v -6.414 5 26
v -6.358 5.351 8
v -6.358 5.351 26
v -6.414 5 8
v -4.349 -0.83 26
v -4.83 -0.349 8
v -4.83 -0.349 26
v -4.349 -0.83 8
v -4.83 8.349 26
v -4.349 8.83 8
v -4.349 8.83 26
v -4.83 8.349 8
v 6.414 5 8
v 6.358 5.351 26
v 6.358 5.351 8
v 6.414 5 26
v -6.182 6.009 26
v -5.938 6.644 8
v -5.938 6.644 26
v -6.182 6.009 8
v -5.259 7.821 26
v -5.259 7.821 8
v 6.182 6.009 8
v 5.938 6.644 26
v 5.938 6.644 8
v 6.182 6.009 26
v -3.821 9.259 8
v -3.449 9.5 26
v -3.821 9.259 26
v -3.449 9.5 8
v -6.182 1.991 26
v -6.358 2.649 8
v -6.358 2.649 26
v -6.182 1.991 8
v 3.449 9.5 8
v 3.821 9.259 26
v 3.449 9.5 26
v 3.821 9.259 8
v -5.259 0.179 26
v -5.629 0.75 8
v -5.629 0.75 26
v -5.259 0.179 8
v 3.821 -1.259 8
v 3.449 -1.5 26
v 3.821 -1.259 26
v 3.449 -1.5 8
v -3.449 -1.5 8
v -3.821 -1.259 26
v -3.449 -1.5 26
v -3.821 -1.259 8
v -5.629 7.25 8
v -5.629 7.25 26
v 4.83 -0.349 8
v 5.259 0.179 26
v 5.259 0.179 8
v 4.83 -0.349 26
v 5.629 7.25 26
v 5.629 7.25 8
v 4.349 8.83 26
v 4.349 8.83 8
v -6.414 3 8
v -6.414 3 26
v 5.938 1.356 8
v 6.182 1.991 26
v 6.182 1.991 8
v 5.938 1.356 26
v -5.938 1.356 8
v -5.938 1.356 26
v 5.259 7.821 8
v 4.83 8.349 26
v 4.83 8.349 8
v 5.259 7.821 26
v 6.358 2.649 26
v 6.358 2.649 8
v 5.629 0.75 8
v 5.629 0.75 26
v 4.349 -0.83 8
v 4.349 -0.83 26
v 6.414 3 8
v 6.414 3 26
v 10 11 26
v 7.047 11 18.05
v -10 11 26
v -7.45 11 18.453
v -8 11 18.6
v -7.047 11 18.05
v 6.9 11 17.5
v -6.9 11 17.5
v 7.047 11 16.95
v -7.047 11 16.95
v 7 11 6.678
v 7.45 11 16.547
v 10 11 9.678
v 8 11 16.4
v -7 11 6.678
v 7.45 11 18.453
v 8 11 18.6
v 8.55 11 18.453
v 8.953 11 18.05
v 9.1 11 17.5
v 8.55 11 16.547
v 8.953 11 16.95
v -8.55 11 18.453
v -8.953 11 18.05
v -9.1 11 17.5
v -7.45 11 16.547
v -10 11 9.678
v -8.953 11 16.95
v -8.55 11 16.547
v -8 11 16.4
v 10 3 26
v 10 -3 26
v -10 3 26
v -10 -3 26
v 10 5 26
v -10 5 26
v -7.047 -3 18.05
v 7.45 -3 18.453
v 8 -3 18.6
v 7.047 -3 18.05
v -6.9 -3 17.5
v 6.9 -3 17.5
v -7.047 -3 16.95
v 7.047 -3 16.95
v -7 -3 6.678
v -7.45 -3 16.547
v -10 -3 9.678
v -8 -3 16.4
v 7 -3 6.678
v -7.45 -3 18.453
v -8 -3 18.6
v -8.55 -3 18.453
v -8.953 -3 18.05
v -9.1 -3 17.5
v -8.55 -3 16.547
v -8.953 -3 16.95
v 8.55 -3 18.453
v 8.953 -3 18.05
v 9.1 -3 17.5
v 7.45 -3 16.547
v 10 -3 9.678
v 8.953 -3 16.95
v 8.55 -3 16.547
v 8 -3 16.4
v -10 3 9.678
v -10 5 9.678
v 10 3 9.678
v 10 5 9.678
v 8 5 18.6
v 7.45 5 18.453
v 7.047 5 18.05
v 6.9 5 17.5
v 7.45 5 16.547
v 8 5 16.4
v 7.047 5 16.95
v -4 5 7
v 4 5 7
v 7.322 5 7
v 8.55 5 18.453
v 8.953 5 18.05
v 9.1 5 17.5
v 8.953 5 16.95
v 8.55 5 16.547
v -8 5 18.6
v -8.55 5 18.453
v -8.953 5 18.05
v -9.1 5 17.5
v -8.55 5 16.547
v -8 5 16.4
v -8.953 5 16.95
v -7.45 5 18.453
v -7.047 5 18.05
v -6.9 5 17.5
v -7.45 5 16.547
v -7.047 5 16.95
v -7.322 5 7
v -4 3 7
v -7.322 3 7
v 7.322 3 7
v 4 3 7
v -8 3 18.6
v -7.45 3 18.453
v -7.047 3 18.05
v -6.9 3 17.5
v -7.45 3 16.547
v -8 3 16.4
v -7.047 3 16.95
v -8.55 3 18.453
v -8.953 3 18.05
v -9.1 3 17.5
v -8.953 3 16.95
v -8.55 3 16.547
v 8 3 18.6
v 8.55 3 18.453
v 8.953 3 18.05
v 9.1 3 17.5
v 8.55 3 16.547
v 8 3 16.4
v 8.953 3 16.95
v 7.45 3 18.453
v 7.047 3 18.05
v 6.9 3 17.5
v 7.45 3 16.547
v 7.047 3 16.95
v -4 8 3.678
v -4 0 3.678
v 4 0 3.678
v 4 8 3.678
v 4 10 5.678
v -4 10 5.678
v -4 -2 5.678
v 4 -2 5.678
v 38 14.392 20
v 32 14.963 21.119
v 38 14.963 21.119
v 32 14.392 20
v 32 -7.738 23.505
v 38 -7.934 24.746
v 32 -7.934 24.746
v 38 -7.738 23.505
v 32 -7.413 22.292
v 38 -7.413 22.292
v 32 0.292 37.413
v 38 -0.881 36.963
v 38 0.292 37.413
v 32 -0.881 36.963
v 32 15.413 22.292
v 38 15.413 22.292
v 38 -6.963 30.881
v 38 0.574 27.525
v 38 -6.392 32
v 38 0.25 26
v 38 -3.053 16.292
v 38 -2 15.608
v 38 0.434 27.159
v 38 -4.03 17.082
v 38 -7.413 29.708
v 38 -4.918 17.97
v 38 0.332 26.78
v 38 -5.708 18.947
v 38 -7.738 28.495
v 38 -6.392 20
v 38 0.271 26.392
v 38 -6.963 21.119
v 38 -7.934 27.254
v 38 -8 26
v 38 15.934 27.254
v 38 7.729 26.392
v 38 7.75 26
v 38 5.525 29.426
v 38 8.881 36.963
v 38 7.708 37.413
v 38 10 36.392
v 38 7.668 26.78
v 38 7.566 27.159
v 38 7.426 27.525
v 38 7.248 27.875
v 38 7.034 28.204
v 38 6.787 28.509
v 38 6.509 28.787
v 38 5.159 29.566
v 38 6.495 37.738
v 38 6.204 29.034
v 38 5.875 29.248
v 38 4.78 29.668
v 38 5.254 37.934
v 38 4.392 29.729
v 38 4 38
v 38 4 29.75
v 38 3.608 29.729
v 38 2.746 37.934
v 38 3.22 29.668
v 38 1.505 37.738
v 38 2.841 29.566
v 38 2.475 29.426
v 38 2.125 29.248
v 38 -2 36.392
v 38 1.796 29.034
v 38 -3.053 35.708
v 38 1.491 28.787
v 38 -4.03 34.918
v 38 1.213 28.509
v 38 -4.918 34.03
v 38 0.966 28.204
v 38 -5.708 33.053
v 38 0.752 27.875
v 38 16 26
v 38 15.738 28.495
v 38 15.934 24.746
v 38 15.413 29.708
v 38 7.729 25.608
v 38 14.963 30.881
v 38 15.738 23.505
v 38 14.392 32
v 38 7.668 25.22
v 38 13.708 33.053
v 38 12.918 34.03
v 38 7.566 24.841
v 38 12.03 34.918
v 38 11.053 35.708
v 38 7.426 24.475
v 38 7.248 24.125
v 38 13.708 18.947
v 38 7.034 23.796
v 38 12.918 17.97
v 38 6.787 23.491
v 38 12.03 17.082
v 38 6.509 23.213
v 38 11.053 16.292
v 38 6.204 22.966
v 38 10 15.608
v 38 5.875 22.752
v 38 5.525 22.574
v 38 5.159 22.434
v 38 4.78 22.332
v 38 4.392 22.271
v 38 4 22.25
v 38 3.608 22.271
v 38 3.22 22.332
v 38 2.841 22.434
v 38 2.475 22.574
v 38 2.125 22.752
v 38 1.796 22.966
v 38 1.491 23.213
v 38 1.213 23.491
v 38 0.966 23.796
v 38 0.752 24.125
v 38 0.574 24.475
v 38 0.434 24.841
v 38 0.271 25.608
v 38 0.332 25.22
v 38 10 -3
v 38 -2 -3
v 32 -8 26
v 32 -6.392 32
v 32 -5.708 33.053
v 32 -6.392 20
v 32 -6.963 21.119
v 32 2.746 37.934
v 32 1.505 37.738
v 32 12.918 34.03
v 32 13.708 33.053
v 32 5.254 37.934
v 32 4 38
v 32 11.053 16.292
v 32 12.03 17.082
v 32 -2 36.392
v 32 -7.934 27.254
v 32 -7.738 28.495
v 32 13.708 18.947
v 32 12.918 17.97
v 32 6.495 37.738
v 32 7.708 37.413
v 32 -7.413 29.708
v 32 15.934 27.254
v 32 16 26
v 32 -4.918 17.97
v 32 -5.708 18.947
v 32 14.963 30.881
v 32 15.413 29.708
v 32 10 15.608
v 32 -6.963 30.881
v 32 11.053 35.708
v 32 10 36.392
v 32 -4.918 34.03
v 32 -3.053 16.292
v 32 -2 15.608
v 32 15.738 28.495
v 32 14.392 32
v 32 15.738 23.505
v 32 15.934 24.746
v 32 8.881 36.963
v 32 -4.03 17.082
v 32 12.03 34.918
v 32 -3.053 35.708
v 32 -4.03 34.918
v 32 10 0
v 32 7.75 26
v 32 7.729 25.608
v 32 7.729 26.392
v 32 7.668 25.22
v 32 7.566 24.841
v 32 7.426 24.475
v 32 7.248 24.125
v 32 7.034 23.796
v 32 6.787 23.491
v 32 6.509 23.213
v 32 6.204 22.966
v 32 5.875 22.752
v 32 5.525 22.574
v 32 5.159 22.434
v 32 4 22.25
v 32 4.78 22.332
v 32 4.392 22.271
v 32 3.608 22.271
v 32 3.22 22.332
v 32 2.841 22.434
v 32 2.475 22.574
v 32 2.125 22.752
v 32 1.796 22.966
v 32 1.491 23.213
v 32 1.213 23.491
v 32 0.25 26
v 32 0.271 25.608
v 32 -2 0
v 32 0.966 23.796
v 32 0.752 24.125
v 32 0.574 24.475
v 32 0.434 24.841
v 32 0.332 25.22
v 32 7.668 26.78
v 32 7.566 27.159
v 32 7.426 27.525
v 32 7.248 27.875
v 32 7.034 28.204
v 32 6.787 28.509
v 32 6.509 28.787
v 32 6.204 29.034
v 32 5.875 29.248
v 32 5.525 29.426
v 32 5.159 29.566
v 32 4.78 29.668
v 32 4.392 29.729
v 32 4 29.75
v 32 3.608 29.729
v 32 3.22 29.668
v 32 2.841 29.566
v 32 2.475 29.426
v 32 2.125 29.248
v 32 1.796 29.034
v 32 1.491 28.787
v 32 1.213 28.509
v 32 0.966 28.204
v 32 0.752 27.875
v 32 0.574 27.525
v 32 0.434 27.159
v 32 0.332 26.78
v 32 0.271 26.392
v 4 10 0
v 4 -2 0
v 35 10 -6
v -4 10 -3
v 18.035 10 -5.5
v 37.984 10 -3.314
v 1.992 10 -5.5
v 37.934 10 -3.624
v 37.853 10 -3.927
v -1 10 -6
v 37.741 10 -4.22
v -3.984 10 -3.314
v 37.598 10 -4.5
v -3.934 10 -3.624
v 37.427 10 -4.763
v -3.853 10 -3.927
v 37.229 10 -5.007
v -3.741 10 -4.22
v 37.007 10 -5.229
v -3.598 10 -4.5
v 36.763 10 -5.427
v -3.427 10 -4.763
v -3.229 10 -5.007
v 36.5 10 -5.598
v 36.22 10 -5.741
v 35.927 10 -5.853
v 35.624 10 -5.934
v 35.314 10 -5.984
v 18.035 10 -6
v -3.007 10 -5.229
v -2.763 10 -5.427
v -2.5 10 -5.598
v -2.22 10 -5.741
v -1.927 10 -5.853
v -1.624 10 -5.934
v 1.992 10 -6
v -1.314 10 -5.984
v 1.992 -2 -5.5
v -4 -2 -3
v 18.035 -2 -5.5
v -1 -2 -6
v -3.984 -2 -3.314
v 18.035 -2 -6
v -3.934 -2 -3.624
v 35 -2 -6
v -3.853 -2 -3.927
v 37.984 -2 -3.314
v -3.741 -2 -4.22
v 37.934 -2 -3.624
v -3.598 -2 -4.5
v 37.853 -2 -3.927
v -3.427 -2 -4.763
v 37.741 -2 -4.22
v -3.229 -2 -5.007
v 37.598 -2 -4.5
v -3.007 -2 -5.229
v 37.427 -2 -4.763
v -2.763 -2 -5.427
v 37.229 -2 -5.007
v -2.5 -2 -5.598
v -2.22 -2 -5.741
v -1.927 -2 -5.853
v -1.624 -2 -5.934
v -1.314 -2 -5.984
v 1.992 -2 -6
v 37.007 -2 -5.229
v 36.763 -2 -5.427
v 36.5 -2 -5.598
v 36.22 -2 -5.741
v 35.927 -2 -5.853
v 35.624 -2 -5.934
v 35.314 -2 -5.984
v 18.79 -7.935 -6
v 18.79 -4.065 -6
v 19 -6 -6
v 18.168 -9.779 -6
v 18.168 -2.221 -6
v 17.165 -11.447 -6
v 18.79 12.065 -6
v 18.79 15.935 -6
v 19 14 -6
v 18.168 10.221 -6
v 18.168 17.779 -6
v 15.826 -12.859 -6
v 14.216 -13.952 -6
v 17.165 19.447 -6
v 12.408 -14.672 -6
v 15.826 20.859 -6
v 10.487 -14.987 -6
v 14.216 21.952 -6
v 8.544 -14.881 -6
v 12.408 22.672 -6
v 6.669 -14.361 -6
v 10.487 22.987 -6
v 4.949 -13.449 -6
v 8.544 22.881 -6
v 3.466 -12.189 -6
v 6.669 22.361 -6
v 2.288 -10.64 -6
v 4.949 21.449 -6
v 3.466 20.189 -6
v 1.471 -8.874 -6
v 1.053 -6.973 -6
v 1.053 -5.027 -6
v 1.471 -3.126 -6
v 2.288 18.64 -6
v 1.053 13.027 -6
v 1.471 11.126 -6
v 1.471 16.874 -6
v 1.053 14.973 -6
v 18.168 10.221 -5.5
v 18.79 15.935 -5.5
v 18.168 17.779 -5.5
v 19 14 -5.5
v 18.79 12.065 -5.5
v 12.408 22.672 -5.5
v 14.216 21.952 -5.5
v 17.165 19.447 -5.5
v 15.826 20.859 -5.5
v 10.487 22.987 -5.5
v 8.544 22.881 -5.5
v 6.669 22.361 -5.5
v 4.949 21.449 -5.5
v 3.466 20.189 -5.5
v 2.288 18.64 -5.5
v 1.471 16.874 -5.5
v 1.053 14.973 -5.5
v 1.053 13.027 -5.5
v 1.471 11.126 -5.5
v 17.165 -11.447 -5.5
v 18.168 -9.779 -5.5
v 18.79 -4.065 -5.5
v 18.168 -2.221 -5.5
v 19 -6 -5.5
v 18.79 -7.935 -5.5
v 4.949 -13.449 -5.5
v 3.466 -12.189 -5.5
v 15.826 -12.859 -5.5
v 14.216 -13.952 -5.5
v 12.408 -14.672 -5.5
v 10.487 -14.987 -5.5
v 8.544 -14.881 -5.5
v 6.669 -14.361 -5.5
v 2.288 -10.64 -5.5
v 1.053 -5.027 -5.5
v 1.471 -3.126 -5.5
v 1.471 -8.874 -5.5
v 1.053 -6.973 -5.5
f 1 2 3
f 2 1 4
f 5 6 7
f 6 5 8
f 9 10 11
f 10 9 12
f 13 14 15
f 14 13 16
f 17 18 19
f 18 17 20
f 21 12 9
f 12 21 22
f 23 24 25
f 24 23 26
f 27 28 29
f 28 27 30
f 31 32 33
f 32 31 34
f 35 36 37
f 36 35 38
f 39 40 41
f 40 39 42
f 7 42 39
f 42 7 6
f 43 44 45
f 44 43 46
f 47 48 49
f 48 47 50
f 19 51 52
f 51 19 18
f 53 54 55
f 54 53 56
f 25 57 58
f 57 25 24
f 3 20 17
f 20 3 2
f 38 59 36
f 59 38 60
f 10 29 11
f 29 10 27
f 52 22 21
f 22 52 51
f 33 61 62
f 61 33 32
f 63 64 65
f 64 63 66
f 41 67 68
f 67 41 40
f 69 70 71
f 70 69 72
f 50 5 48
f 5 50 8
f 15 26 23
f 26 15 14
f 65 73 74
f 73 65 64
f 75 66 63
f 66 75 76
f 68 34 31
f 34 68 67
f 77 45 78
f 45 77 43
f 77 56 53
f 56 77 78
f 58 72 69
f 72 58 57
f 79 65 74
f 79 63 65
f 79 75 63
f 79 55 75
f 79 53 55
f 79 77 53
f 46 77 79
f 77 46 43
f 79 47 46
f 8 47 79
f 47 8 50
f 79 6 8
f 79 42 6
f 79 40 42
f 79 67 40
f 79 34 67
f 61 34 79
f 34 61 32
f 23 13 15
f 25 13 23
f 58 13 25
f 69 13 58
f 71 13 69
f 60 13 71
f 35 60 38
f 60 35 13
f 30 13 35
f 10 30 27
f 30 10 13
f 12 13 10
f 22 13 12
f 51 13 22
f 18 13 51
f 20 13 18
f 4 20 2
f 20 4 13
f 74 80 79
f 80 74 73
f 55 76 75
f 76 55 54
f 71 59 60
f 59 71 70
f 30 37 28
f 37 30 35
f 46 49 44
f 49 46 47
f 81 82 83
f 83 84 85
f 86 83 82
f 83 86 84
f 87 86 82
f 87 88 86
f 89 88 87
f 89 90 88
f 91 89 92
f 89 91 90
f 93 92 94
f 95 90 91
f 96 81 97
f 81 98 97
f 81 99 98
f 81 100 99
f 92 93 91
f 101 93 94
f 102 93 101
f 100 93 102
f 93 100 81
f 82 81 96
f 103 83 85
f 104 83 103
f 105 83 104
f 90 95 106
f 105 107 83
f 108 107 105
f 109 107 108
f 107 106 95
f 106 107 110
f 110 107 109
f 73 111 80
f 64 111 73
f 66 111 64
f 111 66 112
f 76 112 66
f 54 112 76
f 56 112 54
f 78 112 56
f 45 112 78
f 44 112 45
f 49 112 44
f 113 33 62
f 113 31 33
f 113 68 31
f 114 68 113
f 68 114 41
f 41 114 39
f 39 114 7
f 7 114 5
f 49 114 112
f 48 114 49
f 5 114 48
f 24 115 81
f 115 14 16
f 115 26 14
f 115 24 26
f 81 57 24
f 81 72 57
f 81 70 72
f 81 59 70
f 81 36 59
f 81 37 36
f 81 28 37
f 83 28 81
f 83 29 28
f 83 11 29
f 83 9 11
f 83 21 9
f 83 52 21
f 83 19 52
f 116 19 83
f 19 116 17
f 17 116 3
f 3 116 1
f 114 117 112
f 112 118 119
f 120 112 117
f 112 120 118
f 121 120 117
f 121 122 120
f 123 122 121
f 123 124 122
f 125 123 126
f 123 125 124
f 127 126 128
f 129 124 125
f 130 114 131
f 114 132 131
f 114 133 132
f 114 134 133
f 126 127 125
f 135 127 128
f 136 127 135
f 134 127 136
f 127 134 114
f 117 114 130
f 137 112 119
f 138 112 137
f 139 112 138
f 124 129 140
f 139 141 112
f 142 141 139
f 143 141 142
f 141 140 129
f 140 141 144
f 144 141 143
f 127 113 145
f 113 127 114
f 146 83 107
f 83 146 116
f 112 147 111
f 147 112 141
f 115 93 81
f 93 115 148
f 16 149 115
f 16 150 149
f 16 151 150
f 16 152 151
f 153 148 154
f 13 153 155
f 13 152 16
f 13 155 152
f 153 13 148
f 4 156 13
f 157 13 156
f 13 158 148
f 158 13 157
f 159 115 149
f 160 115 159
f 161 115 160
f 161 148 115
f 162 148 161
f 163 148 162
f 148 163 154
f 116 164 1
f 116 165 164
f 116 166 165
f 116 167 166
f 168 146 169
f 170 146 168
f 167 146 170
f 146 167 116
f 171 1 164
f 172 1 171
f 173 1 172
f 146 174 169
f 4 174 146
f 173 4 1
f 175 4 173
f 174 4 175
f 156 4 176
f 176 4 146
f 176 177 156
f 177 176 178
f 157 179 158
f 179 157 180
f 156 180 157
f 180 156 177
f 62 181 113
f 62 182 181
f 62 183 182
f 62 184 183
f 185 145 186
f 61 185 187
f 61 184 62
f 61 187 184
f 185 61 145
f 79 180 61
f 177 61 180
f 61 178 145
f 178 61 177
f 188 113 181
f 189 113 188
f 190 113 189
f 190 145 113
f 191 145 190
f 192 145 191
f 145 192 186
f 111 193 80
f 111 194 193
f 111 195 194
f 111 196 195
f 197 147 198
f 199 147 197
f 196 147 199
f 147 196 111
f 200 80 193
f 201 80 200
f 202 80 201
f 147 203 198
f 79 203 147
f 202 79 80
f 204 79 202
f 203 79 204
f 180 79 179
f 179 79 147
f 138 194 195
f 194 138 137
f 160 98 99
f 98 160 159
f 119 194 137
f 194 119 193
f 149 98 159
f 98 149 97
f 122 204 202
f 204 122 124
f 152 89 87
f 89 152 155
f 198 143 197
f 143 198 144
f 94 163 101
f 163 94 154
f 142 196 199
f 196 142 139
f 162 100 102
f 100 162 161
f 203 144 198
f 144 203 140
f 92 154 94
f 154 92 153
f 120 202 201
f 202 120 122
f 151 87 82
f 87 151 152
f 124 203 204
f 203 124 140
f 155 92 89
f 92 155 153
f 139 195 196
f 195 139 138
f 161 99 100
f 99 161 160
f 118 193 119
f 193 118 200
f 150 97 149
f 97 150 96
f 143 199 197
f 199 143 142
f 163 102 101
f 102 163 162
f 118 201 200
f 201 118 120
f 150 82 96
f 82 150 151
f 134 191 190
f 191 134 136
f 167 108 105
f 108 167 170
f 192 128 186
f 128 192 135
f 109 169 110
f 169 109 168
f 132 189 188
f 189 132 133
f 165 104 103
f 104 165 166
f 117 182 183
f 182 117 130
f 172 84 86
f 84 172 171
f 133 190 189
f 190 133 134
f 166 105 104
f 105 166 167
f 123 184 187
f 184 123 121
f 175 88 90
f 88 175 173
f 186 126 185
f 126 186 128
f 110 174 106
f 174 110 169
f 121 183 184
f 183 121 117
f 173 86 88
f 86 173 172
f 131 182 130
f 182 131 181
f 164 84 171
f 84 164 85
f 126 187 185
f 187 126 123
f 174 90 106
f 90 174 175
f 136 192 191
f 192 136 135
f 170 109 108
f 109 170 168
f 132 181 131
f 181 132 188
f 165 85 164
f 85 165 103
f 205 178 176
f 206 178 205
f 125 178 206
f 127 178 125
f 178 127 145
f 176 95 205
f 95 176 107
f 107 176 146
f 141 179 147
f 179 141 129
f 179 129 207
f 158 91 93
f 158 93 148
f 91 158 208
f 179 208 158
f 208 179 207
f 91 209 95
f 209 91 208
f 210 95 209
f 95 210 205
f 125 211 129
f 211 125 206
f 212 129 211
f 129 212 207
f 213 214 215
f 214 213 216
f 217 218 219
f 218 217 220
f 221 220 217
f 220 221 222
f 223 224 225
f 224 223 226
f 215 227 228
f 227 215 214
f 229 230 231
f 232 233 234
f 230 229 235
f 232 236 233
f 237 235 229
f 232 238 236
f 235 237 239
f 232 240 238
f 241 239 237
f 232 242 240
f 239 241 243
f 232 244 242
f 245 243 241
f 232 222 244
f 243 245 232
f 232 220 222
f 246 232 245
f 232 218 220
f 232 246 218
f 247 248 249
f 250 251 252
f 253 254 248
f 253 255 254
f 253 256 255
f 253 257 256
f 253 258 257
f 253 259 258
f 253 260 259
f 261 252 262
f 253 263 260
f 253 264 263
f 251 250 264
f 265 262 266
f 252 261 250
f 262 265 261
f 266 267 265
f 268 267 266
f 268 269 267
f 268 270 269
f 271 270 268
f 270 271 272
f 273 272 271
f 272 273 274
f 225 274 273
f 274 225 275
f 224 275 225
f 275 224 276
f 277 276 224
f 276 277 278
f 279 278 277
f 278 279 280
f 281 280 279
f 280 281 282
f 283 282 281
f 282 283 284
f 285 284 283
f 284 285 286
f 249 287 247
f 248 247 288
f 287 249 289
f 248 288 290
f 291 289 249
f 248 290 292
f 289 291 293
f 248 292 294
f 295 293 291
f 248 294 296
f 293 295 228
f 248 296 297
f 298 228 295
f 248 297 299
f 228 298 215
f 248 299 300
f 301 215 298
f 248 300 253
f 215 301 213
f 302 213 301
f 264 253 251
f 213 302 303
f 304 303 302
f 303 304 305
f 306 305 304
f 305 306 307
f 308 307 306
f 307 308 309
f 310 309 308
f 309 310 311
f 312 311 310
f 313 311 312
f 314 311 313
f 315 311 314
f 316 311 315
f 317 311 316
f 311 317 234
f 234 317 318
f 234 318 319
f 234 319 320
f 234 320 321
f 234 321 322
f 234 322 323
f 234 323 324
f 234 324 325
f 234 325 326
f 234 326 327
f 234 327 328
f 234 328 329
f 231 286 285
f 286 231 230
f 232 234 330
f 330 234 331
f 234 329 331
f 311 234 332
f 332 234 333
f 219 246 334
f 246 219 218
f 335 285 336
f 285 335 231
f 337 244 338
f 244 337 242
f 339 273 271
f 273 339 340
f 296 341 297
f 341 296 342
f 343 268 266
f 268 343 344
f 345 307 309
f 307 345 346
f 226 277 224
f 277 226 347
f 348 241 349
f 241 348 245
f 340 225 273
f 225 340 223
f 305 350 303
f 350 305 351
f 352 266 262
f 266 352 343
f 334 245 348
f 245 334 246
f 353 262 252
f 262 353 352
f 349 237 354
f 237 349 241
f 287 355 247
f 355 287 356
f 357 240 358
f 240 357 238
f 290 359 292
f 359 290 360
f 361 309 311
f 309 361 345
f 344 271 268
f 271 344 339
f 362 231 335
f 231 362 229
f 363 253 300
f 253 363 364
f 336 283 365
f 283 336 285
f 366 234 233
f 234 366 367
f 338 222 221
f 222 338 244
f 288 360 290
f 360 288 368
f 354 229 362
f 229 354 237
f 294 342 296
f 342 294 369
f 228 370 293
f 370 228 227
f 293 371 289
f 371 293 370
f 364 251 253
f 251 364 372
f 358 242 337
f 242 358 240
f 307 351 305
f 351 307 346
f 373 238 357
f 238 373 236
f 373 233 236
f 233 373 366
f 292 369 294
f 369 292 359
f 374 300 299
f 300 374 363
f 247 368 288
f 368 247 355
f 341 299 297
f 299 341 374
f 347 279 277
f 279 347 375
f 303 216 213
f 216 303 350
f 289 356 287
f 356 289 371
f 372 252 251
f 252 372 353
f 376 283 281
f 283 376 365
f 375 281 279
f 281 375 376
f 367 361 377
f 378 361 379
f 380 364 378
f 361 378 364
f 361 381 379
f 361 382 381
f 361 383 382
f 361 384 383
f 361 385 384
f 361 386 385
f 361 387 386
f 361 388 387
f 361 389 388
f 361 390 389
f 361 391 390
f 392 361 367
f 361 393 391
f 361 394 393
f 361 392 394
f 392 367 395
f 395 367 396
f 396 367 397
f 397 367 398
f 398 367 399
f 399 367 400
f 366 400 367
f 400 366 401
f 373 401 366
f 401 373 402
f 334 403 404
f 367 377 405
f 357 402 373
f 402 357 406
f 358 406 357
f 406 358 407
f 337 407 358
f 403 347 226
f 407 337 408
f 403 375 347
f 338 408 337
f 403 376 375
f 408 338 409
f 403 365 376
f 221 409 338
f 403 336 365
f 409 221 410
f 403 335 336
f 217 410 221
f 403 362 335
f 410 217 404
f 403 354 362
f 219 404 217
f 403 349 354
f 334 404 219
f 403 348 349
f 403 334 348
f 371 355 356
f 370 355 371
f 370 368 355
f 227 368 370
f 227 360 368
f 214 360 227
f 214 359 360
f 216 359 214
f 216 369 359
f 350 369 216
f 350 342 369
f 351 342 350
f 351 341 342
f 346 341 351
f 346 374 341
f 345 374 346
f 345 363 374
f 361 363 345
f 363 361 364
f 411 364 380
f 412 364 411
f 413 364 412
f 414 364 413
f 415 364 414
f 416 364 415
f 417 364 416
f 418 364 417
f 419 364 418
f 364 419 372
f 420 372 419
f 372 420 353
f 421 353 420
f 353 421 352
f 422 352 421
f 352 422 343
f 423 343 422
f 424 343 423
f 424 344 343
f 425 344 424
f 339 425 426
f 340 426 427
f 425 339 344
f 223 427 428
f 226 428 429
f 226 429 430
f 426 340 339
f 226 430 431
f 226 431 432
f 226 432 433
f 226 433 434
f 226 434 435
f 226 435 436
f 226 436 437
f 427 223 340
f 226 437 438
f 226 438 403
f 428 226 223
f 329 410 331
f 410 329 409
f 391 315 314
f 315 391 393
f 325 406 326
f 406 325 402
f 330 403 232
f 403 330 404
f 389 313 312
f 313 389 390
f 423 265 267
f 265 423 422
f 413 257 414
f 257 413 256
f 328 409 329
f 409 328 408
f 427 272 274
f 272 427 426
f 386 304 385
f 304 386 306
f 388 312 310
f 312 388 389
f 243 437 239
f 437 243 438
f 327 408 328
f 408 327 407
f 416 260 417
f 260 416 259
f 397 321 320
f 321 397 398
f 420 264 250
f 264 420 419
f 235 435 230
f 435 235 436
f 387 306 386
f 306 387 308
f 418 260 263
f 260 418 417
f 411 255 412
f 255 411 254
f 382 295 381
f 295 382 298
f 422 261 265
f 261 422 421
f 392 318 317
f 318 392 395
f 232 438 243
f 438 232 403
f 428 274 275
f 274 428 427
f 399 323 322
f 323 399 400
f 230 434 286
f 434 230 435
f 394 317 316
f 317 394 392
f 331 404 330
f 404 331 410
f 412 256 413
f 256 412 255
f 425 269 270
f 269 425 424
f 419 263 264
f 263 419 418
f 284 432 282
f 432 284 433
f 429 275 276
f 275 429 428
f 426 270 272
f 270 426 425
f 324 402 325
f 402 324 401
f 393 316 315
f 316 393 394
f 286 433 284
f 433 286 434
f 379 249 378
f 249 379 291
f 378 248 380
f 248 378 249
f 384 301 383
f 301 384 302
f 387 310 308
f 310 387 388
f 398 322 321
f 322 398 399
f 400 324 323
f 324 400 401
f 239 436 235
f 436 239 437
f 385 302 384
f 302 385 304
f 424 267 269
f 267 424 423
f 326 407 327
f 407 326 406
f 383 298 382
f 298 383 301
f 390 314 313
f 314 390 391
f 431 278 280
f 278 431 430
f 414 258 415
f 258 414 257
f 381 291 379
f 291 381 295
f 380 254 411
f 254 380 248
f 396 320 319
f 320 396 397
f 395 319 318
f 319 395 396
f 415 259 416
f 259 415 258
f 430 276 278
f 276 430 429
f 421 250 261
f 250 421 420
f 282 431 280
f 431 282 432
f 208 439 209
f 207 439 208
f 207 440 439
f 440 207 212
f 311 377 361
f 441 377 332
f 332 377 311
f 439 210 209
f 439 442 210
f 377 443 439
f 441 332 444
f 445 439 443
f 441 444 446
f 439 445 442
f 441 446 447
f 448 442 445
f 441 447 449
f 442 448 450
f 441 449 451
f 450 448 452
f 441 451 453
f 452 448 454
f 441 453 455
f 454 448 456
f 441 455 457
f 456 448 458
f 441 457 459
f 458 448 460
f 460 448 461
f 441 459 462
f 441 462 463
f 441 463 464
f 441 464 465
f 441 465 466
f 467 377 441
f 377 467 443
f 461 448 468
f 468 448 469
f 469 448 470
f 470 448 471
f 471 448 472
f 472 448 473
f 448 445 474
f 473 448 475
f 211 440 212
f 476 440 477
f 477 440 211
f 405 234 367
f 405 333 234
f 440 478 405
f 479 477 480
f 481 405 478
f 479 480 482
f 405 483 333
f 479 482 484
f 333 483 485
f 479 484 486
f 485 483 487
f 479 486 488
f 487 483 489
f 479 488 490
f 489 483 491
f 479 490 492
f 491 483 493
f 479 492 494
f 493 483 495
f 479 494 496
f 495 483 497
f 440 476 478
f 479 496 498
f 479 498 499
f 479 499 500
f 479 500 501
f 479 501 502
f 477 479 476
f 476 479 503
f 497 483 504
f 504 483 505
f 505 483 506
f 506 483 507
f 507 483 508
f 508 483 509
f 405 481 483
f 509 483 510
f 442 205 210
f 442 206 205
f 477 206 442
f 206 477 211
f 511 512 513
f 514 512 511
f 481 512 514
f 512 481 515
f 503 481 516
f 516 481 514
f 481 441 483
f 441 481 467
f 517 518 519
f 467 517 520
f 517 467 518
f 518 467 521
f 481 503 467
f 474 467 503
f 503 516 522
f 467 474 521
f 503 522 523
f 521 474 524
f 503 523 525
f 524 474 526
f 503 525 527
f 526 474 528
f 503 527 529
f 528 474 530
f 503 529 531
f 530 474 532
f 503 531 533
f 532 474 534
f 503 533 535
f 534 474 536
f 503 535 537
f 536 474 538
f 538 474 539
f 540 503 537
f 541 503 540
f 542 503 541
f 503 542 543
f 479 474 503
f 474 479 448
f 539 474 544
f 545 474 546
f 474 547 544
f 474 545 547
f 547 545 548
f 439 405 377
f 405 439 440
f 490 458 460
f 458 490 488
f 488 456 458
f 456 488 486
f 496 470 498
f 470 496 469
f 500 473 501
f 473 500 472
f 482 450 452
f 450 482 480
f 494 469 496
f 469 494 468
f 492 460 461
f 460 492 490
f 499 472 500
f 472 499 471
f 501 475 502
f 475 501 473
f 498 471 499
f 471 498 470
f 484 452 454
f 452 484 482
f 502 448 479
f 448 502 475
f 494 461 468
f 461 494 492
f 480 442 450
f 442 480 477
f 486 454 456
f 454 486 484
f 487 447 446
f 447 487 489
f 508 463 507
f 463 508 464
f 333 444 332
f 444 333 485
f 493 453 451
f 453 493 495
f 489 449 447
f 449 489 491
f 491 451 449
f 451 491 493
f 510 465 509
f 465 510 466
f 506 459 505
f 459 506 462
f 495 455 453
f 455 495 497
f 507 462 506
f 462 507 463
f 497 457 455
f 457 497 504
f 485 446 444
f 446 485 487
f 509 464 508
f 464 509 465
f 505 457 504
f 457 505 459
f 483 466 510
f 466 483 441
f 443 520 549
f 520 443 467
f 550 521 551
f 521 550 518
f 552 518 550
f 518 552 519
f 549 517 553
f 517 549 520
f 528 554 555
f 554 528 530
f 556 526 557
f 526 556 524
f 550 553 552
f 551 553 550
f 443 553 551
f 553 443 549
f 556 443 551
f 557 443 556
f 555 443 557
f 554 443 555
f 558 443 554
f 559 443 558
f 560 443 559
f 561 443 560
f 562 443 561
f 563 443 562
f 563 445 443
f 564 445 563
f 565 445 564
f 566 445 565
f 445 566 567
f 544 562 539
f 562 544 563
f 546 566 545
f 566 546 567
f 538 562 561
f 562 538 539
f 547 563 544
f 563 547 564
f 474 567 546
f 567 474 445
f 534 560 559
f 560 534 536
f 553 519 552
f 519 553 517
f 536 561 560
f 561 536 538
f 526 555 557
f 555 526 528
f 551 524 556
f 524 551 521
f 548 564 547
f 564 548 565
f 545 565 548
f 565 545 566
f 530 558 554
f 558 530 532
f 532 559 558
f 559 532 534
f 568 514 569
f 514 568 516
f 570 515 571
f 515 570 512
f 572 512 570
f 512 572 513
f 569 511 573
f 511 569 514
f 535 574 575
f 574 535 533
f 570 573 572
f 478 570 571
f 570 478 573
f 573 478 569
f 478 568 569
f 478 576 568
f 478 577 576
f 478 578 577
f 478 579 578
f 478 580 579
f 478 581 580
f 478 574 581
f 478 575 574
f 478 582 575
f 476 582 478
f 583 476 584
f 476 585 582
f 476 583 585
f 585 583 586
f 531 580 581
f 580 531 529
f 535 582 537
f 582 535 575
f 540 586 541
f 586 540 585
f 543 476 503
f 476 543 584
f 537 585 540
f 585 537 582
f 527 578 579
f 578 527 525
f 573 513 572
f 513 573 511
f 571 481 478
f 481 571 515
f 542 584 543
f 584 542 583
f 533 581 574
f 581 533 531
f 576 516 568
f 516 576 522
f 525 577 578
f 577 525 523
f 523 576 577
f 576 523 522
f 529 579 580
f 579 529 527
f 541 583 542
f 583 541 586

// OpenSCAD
translate([0,4,3])rotate([0,0,90])
clamp();

// apoyos para imprimir sin despegarse
translate([10,14,-6])cylinder(d=18,h=0.5);
translate([10,-6,-6])cylinder(d=18,h=0.5);

rotate([-90,0,0]) bracket();

module bracket(){
$fn=60;
difference(){
translate([32,-26,4])rotate([0,90,0])
cylinder(d=24,h=6);
translate([30,-26,4])rotate([0,90,0])
cylinder(d=7.5,h=9);
}

translate([-4,-7,-2])cube([8,10,12]);
translate([32,-22,-2])cube([6,25,12]);
translate([-1,0,-2])cube([36,6,12]);

translate([-1,3,-2])rotate([0,0,-90])
cylinder(d=6,h=12);
translate([35,3,-2])rotate([0,0,-90])
cylinder(d=6,h=12);

}
//translate([-18,-20,-1])cube([10,10,20]);

module clamp(){
difference(){
translate([-7,-10,0])
cube([14,20,23]);
difference(){
    translate([0,0,5])cylinder(d=13,h=25,$fn=60);
    translate([6.5,0,12])cube([2,12,25],center=true);
    translate([-6.5,0,12])cube([2,12,25],center=true);
}
translate([-1,-11,4])cube([2,22,25]);
translate([-9,-8,14.5])rotate([0,90,0])
cylinder(d=2.2,h=21,$fn=12);
translate([-9,8,14.5])rotate([0,90,0])
cylinder(d=2.2,h=21,$fn=12);
translate([0,21,0])rotate([45,0,0])cube(size=[25,25,25],center=true);
translate([0,-21,0])rotate([45,0,0])cube(size=[25,25,25],center=true);
translate([21,0,0])rotate([0,0,90])rotate([45,0,0])
cube(size=[25,25,25],center=true);
translate([-21,0,0])rotate([0,0,90])rotate([45,0,0])
cube(size=[25,25,25],center=true);
}
}
